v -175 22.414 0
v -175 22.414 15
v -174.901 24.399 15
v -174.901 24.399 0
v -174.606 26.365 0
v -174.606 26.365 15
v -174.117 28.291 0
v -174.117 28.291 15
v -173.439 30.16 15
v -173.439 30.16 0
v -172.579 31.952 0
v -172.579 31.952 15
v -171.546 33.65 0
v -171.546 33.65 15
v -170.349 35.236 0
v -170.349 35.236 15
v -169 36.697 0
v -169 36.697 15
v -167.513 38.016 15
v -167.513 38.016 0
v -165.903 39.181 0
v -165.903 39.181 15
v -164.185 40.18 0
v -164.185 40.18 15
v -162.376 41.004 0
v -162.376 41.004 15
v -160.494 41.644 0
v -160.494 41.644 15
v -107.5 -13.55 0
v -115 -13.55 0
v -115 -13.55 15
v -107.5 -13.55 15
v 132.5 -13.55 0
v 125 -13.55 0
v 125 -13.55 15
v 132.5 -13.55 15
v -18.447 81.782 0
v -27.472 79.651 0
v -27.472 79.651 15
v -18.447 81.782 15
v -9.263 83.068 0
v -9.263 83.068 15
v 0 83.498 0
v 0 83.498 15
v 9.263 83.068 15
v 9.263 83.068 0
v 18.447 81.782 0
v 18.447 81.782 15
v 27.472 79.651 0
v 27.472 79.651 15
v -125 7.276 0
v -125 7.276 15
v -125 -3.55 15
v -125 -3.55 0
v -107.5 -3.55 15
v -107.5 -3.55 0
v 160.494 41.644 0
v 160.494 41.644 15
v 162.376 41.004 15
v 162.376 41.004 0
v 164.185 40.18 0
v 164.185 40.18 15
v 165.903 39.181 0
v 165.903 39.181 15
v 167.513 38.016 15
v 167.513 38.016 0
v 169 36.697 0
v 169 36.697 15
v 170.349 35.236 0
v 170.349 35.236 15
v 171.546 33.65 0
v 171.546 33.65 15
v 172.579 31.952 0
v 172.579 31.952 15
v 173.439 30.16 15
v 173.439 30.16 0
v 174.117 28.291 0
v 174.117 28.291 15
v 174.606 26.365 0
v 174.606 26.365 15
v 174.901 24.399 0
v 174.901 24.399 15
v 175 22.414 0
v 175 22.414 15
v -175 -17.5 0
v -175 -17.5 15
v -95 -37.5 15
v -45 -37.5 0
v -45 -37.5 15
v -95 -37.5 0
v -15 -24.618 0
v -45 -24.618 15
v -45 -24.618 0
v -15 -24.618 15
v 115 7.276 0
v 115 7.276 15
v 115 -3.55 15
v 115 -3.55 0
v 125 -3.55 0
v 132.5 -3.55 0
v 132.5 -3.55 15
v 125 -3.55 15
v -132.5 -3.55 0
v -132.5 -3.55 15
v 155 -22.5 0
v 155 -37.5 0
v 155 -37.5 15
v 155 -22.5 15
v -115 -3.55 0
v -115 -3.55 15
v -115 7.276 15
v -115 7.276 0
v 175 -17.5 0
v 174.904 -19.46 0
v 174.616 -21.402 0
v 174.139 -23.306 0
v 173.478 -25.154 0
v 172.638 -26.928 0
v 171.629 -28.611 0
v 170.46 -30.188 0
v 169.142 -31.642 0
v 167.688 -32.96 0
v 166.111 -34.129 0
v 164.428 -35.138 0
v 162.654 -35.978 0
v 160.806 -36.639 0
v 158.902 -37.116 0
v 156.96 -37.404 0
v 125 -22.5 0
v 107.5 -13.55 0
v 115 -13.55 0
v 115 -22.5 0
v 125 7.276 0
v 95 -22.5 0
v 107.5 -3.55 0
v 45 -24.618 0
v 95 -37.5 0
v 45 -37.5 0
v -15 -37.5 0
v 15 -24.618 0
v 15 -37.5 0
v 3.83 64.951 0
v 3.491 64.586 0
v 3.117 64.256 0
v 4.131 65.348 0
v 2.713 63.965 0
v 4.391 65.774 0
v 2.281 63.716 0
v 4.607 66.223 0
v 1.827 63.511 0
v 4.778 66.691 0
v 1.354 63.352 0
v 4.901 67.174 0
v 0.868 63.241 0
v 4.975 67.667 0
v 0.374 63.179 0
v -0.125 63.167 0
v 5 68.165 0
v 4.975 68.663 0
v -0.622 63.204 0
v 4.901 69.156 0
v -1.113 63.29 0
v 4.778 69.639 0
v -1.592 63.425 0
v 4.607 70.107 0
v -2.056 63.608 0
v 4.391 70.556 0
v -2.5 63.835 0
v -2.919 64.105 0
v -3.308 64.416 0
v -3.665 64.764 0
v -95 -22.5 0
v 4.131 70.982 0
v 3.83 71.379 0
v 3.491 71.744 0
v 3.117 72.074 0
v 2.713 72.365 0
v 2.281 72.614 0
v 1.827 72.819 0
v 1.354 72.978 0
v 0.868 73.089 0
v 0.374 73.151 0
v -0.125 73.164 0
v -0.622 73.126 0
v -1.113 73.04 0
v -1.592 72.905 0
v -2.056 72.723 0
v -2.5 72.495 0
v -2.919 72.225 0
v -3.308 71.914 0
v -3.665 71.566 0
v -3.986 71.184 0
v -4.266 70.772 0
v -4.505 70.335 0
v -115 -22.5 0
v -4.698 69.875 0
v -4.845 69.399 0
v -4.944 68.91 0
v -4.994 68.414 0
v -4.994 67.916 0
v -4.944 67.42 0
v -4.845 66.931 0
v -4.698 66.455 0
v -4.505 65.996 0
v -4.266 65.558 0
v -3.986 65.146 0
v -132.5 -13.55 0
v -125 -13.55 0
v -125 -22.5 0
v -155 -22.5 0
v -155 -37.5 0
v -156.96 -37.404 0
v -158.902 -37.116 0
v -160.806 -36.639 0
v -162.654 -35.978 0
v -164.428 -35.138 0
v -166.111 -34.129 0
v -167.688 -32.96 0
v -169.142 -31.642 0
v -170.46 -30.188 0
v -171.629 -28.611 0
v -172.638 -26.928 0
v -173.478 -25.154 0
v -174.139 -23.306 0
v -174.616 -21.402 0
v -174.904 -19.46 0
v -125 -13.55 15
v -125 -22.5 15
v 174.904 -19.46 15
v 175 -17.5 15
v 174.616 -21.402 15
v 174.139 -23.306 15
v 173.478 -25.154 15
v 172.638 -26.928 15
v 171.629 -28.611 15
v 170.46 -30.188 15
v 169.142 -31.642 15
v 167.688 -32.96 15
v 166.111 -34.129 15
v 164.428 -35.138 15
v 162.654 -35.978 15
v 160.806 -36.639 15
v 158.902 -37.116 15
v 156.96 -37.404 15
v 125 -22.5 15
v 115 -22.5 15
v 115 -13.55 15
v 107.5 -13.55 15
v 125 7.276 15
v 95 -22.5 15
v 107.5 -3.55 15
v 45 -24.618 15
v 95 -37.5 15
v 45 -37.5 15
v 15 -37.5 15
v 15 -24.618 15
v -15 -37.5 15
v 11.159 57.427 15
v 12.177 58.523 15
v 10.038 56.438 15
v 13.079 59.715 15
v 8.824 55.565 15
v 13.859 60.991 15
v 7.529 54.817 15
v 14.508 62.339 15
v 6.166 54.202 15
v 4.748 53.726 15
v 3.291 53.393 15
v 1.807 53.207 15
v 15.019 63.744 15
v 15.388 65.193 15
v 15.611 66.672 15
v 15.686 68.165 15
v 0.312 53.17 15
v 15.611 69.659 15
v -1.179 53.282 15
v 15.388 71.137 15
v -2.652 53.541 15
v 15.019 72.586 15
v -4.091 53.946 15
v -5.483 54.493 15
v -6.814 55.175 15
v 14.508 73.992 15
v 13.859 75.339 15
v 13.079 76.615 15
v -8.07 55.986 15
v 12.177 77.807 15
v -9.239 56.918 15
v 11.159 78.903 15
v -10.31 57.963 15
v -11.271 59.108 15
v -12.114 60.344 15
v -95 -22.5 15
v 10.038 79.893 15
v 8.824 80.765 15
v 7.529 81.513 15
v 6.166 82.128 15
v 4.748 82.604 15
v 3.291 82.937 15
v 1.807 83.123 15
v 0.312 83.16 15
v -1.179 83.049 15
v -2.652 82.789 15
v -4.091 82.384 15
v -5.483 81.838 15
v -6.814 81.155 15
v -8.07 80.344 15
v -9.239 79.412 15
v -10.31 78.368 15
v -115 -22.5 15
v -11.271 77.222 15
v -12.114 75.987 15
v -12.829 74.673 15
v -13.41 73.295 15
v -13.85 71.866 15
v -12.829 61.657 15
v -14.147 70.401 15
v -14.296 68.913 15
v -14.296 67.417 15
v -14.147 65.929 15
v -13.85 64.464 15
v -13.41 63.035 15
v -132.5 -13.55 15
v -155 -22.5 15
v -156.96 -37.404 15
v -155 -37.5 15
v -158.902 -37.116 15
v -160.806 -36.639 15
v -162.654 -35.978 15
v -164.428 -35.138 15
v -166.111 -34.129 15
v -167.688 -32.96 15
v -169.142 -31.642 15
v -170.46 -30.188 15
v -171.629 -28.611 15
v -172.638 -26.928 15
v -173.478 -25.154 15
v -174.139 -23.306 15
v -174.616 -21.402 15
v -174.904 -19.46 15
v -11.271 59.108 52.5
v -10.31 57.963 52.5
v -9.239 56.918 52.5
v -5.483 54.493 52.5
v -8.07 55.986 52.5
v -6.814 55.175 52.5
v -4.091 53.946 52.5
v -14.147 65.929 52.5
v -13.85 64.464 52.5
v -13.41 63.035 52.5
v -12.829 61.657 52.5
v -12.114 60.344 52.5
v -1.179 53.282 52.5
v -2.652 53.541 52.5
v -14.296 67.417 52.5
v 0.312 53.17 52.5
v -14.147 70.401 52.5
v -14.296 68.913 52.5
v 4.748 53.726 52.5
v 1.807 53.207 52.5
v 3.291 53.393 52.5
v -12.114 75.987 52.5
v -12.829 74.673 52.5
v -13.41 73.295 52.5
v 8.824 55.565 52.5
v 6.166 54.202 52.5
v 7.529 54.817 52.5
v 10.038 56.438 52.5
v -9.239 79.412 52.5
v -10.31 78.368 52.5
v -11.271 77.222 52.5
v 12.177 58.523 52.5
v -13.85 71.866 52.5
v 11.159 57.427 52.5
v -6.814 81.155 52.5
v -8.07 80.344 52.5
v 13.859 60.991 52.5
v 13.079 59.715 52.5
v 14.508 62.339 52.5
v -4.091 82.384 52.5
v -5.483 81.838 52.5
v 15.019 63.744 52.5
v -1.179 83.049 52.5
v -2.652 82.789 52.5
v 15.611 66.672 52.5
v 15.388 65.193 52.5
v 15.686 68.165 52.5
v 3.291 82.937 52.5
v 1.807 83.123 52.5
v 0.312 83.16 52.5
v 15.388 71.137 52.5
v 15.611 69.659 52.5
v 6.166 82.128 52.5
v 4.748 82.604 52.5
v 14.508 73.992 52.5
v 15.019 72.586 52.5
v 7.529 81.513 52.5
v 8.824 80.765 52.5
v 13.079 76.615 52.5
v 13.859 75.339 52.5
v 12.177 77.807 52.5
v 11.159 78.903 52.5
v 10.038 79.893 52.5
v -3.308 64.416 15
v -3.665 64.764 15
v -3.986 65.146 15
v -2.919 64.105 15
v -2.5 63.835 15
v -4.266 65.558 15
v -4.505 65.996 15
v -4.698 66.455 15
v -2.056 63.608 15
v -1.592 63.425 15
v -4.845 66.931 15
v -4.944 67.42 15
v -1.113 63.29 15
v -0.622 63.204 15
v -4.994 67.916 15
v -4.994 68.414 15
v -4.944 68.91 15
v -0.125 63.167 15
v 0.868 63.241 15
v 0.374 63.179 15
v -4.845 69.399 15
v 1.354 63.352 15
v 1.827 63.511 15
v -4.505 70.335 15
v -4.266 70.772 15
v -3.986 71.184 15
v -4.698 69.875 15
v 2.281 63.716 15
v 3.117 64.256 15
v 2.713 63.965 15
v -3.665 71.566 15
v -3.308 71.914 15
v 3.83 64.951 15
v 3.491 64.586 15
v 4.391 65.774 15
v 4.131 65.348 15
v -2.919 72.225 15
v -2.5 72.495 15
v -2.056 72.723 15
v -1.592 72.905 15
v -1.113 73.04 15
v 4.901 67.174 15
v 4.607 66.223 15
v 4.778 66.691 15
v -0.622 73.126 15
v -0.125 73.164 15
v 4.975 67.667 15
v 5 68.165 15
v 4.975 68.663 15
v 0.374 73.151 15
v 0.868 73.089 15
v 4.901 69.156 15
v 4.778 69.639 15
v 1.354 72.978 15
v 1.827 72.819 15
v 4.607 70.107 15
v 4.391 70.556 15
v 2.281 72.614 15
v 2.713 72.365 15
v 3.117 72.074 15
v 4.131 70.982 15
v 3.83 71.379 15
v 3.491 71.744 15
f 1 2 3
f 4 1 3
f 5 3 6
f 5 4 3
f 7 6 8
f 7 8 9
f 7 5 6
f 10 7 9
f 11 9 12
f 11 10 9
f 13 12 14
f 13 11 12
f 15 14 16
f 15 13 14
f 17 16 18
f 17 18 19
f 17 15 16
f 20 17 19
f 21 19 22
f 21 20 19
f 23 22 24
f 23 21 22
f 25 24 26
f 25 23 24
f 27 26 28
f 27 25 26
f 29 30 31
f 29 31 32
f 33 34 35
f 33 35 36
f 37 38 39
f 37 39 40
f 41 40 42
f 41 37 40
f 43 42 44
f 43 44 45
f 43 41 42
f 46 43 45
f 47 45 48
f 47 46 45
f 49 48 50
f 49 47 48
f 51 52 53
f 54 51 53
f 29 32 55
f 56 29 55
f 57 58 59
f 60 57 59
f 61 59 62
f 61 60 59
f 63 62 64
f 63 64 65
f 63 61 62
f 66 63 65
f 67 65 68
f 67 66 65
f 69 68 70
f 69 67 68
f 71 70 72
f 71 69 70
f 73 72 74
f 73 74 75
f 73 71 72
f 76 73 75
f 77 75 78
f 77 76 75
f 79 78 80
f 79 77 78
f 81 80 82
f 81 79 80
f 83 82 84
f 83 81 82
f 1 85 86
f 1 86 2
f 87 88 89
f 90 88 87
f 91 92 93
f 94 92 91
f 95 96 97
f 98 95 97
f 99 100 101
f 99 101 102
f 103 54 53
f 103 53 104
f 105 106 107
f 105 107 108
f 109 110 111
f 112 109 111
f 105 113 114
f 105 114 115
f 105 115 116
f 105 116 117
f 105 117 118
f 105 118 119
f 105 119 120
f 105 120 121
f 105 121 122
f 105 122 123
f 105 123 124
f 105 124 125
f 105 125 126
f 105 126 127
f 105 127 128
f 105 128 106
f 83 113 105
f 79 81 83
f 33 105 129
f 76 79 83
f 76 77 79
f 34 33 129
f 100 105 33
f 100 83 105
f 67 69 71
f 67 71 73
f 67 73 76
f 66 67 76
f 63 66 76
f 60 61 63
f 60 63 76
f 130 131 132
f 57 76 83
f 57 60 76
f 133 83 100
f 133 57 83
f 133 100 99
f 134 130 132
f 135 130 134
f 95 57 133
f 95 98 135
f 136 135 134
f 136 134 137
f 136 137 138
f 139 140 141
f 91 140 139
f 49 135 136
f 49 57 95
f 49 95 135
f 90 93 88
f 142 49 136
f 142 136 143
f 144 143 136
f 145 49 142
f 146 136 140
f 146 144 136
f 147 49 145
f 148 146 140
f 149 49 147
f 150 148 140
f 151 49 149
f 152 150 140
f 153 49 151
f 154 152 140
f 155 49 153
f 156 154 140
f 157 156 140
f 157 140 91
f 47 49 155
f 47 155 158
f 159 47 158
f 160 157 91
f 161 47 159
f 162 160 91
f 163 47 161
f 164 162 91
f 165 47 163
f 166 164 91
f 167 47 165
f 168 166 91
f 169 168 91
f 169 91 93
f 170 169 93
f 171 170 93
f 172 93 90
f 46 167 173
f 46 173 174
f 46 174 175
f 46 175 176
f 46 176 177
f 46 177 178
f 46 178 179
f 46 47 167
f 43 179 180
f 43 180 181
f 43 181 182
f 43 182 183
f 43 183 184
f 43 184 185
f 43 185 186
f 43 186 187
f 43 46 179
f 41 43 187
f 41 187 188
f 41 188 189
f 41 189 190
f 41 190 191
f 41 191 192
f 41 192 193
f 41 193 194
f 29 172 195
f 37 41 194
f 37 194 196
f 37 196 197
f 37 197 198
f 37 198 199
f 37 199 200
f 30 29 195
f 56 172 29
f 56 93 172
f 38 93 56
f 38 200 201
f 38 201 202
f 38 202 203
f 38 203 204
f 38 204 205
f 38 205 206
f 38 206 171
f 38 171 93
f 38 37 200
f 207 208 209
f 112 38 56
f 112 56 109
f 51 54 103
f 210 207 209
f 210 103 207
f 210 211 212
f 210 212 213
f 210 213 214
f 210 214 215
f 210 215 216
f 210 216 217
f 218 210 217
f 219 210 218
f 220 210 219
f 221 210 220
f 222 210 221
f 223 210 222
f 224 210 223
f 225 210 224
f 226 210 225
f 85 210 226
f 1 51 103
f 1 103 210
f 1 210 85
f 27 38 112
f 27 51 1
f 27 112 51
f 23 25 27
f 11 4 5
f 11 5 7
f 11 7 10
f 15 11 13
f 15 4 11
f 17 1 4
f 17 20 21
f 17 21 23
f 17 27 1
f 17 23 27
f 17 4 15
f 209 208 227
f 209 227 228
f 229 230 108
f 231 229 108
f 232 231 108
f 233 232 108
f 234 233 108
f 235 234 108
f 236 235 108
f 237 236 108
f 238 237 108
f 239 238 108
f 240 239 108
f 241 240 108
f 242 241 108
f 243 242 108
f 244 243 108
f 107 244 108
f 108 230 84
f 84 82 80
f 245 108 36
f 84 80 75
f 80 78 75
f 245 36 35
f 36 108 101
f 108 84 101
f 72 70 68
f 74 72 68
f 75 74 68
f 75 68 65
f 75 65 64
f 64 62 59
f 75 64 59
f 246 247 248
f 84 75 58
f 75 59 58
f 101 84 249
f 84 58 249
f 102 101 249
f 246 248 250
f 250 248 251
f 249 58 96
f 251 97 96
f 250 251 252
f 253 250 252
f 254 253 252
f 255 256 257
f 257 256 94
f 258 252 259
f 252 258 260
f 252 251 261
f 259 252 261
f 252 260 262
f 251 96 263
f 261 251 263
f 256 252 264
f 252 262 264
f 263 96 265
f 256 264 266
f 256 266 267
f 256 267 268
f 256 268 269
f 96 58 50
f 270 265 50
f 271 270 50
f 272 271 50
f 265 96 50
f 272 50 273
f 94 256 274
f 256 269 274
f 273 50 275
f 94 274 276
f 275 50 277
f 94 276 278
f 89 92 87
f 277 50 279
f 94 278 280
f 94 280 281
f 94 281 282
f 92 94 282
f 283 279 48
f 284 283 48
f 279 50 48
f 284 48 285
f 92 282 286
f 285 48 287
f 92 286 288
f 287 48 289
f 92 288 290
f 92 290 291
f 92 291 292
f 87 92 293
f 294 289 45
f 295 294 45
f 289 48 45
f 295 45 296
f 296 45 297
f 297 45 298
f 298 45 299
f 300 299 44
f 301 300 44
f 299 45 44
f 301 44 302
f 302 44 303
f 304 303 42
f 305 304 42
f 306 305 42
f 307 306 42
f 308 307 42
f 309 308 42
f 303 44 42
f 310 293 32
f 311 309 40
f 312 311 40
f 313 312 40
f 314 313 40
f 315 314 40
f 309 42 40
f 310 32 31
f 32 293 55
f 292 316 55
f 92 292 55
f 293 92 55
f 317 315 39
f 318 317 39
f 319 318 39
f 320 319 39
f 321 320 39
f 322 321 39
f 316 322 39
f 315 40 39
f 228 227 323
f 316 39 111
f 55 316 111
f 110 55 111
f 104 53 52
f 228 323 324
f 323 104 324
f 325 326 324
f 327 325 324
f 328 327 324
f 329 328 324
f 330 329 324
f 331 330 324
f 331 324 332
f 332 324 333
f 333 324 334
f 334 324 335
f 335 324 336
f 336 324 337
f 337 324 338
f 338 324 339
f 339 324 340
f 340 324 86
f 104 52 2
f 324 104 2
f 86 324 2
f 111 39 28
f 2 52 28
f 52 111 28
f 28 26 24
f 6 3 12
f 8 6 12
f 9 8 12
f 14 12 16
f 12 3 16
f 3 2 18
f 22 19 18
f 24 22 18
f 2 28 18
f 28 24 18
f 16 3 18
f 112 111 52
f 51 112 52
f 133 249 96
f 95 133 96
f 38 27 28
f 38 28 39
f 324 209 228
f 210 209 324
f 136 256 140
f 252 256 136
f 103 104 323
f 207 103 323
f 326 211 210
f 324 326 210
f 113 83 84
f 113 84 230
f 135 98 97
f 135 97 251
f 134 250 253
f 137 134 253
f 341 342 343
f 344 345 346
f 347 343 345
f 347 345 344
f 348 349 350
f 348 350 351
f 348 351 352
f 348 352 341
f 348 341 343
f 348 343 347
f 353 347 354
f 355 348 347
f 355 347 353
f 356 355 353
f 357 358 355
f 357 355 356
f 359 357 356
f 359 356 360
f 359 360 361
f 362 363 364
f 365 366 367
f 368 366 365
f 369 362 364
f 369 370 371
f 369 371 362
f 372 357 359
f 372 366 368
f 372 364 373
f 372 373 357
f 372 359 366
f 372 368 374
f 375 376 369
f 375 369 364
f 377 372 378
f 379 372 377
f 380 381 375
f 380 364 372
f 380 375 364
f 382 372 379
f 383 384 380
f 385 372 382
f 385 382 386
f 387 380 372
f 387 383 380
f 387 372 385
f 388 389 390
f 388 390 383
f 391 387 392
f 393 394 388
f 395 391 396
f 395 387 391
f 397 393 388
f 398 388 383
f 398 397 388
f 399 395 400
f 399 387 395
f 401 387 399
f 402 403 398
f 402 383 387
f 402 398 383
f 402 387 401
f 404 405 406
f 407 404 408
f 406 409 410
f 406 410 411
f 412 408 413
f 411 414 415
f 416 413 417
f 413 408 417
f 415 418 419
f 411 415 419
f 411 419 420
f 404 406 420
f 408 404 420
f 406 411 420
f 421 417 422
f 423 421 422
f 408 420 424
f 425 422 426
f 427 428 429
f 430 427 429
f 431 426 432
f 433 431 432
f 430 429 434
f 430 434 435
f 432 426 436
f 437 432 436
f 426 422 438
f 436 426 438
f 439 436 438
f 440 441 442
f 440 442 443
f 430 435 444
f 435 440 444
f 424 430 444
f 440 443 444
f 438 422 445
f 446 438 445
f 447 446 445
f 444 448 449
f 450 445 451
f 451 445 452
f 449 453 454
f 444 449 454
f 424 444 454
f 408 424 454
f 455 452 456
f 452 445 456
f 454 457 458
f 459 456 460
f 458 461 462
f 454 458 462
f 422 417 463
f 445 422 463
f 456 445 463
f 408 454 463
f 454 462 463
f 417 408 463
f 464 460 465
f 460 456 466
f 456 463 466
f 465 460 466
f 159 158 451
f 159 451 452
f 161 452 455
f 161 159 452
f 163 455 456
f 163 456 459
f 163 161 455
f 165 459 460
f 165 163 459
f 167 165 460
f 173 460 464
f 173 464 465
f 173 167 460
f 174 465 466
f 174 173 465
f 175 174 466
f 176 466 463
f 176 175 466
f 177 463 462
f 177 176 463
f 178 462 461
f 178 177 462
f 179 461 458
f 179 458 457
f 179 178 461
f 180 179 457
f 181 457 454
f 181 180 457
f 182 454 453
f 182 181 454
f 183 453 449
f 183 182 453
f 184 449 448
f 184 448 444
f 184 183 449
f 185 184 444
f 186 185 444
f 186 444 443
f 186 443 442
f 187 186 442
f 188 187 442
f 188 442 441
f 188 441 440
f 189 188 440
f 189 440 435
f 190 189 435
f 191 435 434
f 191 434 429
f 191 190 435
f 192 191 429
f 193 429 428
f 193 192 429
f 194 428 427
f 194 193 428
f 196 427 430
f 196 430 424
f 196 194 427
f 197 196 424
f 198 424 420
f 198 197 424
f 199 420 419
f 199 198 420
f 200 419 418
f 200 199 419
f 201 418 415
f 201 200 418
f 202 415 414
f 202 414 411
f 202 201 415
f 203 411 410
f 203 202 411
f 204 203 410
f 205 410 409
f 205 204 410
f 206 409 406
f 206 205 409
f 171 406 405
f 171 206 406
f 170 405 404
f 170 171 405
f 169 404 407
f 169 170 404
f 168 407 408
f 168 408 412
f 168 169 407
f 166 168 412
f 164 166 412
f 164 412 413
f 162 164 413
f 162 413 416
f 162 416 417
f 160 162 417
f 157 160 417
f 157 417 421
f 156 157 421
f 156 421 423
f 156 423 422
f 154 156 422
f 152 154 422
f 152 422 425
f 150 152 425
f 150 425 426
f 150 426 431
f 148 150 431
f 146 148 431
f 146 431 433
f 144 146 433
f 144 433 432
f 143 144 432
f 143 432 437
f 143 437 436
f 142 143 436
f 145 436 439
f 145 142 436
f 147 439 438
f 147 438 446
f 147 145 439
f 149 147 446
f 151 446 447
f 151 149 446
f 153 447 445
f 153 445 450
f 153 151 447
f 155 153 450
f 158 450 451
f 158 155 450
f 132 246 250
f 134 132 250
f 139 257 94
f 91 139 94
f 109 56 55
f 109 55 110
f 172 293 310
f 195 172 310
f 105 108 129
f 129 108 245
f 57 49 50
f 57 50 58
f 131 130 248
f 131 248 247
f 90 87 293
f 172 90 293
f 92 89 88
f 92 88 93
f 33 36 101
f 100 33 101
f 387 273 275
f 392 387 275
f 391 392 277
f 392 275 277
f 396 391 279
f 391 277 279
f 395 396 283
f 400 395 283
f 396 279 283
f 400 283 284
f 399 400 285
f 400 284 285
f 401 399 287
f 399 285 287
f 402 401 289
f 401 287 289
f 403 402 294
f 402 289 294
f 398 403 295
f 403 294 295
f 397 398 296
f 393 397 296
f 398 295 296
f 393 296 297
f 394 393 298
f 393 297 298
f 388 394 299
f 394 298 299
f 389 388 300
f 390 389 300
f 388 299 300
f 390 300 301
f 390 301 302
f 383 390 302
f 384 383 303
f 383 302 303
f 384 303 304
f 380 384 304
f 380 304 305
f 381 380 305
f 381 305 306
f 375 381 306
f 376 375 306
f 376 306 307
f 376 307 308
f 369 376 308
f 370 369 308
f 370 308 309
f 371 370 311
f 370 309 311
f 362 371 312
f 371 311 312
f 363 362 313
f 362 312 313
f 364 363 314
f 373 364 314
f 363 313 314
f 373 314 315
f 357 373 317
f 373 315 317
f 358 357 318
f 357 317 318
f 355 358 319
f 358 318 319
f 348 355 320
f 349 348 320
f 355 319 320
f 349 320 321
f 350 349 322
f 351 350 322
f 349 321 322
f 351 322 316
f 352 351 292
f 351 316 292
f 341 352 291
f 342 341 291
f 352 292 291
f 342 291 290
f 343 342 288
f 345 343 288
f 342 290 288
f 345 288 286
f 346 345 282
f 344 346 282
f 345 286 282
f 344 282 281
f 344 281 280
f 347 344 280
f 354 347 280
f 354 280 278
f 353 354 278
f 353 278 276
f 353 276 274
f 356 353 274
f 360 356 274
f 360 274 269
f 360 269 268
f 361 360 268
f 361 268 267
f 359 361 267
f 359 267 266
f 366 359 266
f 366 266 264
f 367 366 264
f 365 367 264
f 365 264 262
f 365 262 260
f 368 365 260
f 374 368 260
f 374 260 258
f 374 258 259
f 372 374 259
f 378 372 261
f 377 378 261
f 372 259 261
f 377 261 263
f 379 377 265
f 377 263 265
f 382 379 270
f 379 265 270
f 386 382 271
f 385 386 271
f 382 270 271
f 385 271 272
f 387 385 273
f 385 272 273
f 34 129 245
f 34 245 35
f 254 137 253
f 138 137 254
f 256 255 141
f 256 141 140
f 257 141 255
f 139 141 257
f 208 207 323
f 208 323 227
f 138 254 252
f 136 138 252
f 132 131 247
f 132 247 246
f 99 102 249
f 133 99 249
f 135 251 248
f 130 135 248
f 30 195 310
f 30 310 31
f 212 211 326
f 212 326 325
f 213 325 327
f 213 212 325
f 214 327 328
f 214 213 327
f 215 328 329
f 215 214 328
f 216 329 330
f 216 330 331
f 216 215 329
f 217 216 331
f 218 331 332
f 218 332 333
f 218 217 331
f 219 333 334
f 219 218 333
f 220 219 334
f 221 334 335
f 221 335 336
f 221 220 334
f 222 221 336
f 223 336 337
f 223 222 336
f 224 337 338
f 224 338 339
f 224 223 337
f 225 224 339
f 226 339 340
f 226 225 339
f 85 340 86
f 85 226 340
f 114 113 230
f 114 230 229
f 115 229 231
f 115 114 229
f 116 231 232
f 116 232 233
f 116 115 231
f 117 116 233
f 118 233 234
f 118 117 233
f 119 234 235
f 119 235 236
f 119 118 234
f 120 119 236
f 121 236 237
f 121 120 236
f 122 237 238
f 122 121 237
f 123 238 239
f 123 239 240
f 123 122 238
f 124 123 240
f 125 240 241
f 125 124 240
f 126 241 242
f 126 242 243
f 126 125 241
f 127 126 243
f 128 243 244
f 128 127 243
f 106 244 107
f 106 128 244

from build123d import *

# Parameters (mm, degrees)
ESQUISSE1_R             = 5
BOSS_EXTRU_1_DEPTH      = 15
ESQUISSE2_W             = 30
ESQUISSE2_H             = 12.881717487
ENL_V_MAT_EXTRU_1_DEPTH = 15
ESQUISSE3_W             = 20
ESQUISSE3_H             = 15
ENL_V_MAT_EXTRU_2_DEPTH = 15
ESQUISSE5_R             = 15
BOSS_EXTRU_2_DEPTH      = 37.5


with BuildPart() as part:
    # Esquisse1 → Boss.-Extru.1 (new body)
    with BuildSketch(Plane.XY):
        with BuildLine():
            Line((-160.494422558, 41.644450698), (-27.47211279, 79.650824917))
            ThreePointArc((-27.47211279, 79.650824917), (0, 83.498430153), (27.47211279, 79.650824917))
            Line((27.47211279, 79.650824917), (160.494422558, 41.644450698))
            ThreePointArc((160.494422558, 41.644450698), (170.966972962, 34.457882008), (175, 22.413971745))
            Line((175, 22.413971745), (175, -17.5))
            ThreePointArc((175, -17.5), (169.142135624, -31.642135624), (155, -37.5))
            Line((155, -37.5), (-155, -37.5))
            ThreePointArc((-155, -37.5), (-169.142135624, -31.642135624), (-175, -17.5))
            Line((-175, -17.5), (-175, 22.413971745))
            ThreePointArc((-175, 22.413971745), (-170.966972962, 34.457882008), (-160.494422558, 41.644450698))
        make_face()
        with Locations((0, 68.16509682)):
            Circle(ESQUISSE1_R, mode=Mode.SUBTRACT)
    extrude(amount=BOSS_EXTRU_1_DEPTH)

    # Esquisse2 → Enlèv. mat.-Extru.1 (cut)
    with BuildSketch(Plane.XY.offset(15)):
        Polygon((95, -37.5), (115, -37.5), (125, -37.5), (135, -37.5), (135, -22.5), (125, -22.5), (125, -13.549697849), (132.5, -13.549697849), (132.5, -3.549697849), (125, -3.549697849), (125, 7.276030806), (115, 7.276030806), (115, -3.549697849), (107.5, -3.549697849), (107.5, -13.549697849), (115, -13.549697849), (115, -22.5), (95, -22.5), align=None)
        with Locations((30, -31.059141256)):
            Rectangle(ESQUISSE2_W, ESQUISSE2_H)
        with Locations((-30, -31.059141256)):
            Rectangle(ESQUISSE2_W, ESQUISSE2_H)
        Polygon((-115, -37.5), (-95, -37.5), (-95, -22.5), (-115, -22.5), (-115, -13.549697849), (-107.5, -13.549697849), (-107.5, -3.549697849), (-115, -3.549697849), (-115, 7.276030806), (-125, 7.276030806), (-125, -3.549697849), (-132.5, -3.549697849), (-132.5, -13.549697849), (-125, -13.549697849), (-125, -22.5), (-135, -22.5), (-135, -37.5), (-125, -37.5), align=None)
    extrude(amount=-ENL_V_MAT_EXTRU_1_DEPTH, mode=Mode.SUBTRACT)

    # Esquisse3 → Enlèv. mat.-Extru.2 (cut)
    with BuildSketch(Plane(origin=(0, 0, 0), x_dir=(-1, 0, 0), z_dir=(0, 0, -1))):
        with Locations((145, -30)):
            Rectangle(ESQUISSE3_W, ESQUISSE3_H)
        with Locations((-145, -30)):
            Rectangle(ESQUISSE3_W, ESQUISSE3_H)
    extrude(amount=-ENL_V_MAT_EXTRU_2_DEPTH, mode=Mode.SUBTRACT)

    # Esquisse5 → Boss.-Extru.2 (add)
    with BuildSketch(Plane.XY.offset(15)):
        with Locations((0.685853551, 68.16509682)):
            Circle(ESQUISSE5_R)
    extrude(amount=BOSS_EXTRU_2_DEPTH)


solid = part.part
